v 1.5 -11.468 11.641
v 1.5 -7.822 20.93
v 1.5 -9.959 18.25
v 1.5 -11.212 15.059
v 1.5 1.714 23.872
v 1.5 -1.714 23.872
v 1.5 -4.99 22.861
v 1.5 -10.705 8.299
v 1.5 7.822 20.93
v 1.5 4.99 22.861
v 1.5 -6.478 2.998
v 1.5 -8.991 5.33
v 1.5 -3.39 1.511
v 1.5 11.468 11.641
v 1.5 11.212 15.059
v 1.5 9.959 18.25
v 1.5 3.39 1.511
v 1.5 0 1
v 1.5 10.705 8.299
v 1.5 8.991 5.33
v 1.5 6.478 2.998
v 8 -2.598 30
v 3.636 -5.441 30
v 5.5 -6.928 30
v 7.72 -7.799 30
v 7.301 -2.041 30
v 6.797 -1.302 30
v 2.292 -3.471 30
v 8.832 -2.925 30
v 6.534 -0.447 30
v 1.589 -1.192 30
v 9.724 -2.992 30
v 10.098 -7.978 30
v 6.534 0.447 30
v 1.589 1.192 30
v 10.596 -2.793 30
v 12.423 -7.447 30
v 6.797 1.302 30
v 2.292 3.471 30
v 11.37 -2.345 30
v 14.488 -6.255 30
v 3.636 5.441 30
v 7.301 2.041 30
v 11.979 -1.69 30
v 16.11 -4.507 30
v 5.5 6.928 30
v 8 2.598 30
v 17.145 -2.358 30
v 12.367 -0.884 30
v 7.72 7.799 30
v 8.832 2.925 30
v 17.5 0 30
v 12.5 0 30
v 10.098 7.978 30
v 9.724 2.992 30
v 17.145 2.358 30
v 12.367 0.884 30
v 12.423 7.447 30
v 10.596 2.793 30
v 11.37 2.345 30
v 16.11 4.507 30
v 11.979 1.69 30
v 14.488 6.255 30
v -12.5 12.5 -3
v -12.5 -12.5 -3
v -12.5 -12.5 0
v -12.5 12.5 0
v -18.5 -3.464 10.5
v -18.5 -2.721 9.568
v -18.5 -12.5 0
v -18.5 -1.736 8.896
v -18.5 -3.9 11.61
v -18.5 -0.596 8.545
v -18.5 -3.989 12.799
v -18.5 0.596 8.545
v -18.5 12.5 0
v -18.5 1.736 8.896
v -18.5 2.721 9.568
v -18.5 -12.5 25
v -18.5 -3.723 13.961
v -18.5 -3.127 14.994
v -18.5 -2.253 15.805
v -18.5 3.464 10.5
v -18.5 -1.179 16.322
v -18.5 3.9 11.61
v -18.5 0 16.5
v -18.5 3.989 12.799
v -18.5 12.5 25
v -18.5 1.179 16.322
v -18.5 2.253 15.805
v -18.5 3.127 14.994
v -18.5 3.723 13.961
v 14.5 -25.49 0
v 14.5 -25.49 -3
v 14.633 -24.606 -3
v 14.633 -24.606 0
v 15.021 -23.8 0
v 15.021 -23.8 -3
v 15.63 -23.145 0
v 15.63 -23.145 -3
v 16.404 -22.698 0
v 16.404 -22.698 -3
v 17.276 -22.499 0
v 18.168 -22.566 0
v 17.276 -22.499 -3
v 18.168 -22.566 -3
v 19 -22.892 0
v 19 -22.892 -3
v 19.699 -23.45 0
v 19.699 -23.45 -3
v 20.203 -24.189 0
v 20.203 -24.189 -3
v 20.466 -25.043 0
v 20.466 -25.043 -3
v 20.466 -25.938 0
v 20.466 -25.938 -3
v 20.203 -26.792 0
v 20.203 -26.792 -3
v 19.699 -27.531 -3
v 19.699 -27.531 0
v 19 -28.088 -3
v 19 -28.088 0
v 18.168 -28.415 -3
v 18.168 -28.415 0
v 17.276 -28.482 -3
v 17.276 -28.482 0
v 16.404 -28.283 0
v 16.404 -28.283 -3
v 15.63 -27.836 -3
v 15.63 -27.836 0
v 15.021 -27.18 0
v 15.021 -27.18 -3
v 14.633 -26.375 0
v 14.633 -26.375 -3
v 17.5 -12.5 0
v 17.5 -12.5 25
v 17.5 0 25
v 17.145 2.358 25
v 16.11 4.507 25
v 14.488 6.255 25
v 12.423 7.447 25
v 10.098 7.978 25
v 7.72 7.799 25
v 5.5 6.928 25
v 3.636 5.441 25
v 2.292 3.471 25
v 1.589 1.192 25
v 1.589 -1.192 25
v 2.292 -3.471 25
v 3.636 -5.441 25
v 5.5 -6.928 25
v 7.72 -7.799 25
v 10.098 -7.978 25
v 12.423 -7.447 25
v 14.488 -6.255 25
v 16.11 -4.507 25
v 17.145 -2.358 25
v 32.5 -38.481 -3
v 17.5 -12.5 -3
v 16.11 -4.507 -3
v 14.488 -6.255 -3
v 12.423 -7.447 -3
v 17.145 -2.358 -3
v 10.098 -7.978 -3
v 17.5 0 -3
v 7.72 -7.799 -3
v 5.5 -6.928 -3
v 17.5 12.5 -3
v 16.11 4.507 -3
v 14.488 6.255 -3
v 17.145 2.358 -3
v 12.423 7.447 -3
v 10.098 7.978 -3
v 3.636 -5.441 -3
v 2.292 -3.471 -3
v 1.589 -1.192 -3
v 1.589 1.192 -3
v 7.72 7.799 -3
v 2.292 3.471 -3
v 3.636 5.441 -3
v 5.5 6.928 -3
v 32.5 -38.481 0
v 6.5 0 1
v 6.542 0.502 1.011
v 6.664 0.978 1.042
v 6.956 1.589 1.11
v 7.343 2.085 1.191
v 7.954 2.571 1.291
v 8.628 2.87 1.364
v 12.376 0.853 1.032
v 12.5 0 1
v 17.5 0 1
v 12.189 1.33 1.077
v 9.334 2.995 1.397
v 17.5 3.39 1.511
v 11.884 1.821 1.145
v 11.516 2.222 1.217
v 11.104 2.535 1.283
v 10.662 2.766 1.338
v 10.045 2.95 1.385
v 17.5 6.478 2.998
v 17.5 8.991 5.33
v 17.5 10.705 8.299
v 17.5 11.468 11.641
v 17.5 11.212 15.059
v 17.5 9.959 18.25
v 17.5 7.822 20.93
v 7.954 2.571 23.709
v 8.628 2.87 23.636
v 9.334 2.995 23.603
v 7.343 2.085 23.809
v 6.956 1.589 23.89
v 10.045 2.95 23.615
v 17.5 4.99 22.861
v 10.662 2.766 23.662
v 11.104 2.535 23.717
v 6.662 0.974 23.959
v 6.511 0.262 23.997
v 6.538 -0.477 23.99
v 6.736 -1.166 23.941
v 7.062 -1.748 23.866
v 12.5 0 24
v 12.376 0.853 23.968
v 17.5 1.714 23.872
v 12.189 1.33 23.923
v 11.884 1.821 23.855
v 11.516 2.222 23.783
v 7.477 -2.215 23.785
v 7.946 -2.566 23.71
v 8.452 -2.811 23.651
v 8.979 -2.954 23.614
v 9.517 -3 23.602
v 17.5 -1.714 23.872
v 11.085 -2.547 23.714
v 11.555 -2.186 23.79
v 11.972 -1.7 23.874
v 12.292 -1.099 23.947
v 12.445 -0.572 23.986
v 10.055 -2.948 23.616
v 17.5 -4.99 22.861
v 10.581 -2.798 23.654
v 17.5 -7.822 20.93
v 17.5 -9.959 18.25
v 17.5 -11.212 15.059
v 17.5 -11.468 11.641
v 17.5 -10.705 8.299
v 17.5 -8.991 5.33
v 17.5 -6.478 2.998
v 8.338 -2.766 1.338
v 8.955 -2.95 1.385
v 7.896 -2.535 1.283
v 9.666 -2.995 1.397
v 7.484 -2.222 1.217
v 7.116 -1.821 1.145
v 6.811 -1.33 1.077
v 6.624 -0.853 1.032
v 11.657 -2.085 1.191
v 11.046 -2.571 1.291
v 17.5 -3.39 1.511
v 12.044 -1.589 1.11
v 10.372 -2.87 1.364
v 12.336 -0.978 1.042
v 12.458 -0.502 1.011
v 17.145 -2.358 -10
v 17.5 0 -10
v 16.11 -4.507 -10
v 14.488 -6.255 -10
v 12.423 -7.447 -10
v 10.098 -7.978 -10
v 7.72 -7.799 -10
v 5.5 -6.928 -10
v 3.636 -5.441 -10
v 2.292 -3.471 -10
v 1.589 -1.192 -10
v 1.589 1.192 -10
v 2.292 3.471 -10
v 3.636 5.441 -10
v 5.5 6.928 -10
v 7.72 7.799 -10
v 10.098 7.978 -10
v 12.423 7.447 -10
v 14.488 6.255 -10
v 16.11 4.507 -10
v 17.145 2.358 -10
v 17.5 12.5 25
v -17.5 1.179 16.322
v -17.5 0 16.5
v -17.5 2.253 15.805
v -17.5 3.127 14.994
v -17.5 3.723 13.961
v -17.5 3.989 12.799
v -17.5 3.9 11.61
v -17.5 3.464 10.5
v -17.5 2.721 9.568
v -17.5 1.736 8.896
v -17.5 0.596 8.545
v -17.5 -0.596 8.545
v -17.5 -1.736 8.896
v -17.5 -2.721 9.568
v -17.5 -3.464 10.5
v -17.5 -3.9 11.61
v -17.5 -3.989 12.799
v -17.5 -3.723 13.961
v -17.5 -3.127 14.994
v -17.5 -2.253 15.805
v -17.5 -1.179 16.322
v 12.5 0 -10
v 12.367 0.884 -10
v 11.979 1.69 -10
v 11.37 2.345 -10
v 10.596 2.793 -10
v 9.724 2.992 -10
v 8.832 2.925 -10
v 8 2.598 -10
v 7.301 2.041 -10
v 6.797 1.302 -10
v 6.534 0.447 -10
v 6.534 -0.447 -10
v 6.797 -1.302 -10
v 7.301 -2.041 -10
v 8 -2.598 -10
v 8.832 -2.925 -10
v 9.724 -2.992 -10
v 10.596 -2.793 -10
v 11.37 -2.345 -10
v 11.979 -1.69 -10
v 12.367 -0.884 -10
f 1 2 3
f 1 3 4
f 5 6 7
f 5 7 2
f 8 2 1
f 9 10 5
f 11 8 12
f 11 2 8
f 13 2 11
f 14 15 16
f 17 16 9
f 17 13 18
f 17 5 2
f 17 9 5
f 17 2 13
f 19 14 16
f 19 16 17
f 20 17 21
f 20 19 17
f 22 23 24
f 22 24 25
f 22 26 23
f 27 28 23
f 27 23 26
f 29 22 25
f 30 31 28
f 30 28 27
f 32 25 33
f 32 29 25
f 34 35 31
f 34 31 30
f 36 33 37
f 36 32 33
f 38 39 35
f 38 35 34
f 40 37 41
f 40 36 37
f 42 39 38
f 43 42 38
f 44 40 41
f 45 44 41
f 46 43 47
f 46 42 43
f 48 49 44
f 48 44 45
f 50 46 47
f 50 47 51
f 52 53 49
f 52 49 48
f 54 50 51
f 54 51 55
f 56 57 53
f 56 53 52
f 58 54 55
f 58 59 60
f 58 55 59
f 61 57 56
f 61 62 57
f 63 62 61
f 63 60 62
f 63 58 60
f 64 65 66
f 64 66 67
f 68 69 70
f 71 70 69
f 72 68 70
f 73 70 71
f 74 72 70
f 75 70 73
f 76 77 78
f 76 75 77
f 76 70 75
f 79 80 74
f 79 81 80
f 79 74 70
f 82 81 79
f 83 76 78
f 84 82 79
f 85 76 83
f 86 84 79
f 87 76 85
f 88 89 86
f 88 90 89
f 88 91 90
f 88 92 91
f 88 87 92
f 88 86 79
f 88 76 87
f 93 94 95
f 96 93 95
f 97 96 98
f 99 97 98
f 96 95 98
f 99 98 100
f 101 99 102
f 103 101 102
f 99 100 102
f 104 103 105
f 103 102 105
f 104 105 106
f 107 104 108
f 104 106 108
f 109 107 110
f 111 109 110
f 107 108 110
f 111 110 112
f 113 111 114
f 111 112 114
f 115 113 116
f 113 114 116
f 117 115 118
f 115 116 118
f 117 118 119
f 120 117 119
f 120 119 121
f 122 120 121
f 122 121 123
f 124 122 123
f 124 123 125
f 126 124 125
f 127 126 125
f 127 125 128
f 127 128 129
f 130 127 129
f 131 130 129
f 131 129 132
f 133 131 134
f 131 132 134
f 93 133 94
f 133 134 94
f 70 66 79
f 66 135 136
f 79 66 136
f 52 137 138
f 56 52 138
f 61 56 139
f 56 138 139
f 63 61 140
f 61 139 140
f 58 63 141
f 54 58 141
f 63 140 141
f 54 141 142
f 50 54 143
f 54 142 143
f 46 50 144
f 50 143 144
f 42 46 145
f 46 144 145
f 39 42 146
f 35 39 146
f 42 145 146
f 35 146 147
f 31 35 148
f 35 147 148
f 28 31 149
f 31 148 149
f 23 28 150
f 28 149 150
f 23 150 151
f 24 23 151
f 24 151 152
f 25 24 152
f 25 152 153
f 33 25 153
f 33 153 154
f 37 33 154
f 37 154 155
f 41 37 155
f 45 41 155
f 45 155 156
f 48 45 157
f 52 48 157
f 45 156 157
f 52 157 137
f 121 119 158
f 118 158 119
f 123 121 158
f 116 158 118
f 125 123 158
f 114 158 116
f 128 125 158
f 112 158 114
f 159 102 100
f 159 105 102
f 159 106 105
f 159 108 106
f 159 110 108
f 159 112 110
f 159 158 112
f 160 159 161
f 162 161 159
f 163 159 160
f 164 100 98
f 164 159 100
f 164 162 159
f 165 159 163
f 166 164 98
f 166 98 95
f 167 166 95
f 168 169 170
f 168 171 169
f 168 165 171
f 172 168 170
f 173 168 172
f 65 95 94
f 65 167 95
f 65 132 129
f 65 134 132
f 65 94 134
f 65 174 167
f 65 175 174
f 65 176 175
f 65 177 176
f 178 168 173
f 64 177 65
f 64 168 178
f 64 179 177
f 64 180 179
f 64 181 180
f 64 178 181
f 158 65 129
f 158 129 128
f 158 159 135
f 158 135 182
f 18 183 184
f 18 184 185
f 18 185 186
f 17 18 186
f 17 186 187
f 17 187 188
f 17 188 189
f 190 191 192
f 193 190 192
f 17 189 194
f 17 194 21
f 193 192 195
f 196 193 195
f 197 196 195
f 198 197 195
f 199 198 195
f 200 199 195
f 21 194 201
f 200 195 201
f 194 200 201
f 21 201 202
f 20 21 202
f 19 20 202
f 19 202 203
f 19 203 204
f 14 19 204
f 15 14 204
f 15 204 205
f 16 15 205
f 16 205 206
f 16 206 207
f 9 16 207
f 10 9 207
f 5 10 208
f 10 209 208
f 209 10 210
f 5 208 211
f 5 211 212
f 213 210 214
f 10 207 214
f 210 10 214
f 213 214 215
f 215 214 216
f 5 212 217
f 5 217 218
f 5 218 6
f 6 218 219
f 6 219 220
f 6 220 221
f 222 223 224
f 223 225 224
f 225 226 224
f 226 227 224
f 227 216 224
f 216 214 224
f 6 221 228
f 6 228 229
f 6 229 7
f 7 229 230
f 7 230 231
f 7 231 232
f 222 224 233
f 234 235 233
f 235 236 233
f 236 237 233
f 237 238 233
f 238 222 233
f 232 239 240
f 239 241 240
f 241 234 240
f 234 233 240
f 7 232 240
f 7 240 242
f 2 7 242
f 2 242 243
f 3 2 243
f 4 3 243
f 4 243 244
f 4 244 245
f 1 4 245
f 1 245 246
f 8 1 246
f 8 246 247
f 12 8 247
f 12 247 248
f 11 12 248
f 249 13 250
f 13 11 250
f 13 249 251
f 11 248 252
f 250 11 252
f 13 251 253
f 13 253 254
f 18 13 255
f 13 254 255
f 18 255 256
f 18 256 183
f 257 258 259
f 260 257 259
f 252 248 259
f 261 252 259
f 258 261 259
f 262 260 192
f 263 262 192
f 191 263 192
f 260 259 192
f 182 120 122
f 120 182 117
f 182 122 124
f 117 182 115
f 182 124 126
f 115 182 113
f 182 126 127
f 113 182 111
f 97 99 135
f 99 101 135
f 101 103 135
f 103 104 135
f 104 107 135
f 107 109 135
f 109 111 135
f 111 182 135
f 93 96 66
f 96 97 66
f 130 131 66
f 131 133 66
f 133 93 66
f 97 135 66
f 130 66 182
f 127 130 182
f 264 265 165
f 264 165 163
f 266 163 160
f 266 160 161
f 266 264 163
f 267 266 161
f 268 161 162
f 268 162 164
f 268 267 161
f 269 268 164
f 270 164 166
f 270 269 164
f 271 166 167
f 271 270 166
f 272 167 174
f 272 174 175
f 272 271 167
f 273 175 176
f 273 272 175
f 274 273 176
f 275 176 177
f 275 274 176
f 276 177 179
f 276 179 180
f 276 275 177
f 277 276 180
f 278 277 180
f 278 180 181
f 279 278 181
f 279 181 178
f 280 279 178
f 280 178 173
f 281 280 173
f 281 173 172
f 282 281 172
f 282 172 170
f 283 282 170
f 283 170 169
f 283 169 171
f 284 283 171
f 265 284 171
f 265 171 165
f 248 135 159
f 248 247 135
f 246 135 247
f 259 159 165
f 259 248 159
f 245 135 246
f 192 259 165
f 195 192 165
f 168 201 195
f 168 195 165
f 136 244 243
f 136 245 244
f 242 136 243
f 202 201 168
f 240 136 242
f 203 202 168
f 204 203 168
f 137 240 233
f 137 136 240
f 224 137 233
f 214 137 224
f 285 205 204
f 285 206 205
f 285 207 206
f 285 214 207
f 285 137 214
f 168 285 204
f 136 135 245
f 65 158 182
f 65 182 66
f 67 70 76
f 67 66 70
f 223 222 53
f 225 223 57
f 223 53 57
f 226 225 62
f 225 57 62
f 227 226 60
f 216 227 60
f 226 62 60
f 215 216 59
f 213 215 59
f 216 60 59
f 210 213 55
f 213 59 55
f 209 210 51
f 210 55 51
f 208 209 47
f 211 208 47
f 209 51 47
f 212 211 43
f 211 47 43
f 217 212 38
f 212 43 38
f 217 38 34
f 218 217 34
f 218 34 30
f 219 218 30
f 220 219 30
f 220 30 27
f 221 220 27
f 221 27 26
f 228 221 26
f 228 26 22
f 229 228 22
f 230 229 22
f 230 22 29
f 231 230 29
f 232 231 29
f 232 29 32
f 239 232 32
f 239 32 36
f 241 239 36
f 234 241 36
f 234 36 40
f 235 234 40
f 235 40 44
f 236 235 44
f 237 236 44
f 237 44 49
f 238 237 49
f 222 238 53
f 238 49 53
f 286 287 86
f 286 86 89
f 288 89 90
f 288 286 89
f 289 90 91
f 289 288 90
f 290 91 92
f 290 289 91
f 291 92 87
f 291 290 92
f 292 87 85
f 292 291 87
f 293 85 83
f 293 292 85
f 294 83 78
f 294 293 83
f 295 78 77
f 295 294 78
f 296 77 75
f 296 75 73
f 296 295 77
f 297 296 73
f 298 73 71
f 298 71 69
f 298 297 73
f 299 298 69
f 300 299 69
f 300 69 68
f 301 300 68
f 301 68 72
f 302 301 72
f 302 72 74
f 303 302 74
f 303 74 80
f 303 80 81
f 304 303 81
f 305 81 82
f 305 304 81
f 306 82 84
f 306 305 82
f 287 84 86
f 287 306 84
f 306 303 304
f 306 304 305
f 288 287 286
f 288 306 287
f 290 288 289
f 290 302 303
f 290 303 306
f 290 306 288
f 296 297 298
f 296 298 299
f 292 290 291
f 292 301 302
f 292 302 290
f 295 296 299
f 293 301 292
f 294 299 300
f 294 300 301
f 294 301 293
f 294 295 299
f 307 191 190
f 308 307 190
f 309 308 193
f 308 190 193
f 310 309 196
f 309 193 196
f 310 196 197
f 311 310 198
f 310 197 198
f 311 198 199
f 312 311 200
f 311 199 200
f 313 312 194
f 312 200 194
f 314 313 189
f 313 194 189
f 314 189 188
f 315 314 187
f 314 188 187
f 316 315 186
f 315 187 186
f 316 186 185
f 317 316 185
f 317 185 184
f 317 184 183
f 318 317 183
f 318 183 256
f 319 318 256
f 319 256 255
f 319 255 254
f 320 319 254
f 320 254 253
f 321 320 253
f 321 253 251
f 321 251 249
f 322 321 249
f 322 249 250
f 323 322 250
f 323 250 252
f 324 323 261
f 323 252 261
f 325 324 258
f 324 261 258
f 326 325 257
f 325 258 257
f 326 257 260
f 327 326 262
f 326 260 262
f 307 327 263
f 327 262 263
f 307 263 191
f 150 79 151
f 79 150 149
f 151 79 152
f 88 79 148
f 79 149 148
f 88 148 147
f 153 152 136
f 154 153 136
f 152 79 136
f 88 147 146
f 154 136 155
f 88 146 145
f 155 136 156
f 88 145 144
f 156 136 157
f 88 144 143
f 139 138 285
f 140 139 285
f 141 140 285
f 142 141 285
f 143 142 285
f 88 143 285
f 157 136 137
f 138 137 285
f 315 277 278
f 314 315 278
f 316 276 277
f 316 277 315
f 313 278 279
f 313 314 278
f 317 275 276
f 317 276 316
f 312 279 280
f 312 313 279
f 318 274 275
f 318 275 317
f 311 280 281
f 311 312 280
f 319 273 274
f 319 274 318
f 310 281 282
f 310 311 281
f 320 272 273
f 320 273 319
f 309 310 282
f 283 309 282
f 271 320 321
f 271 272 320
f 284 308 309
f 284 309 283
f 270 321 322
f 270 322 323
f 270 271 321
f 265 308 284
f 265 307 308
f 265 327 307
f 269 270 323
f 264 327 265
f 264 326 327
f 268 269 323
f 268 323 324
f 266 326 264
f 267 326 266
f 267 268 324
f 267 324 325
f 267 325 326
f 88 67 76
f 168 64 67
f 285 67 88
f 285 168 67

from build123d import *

# Parameters (mm, degrees)
SKETCH_1_W          = 35
SKETCH_1_H          = 25
SKETCH_1_R          = 8
EXTRUDE_2_DEPTH     = 25
SKETCH_2_R          = 8
EXTRUDE_3_DEPTH     = 5
EXTRUDE_START       = 10
SKETCH_3_R          = 8
EXTRUDE_4_DEPTH     = 10
SKETCH_4_R          = 3
CUT_EXTRUDE_1_DEPTH = 46.414755311
SKETCH_5_R          = 11.5
CUT_EXTRUDE_2_DEPTH = 16
SKETCH_6_R          = 4
EXTRUDE_5_DEPTH     = 15
SKETCH_8_W          = 3
SKETCH_8_H          = 2.025472792
CUT_EXTRUDE_3_DEPTH = 15
EXTRUDE_START_2     = -2
SKETCH_9_R          = 4
EXTRUDE_6_DEPTH     = 2
SKETCH_10_R         = 4
EXTRUDE_7_DEPTH     = 2
EXTRUDE_START_3     = 3
SKETCH_12_R         = 3
SKETCH_12_R_2       = 8
EXTRUDE_11_DEPTH    = 3
SKETCH_14_W         = 6.627877622
SKETCH_14_H         = 25
CUT_EXTRUDE_4_DEPTH = 3
SKETCH_15_W         = 25
SKETCH_15_H         = 25
CUT_EXTRUDE_5_DEPTH = 70.862501092
SKETCH_16_W         = 25
SKETCH_16_H         = 25
SKETCH_16_R         = 4
EXTRUDE_12_DEPTH    = 1


with BuildPart() as part:
    # 草图1 → 凸台-拉伸2 (new body)
    # profile 1 of 2: a face of its own
    with BuildSketch(Plane.XY):
        Rectangle(SKETCH_1_W, SKETCH_1_H)
        with Locations((9.5, 0)):
            Circle(SKETCH_1_R, mode=Mode.SUBTRACT)
    # profile 2 of 2: a face of its own
    with BuildSketch(Plane.XY):
        with Locations((9.5, 0)):
            Circle(SKETCH_1_R)
    extrude(amount=EXTRUDE_2_DEPTH)

    # 草图2 → 凸台-拉伸3 (add)
    with BuildSketch(Plane.XY.offset(25)):
        with Locations((9.5, 0)):
            Circle(SKETCH_2_R)
    extrude(amount=EXTRUDE_3_DEPTH)

    # 草图3 → 凸台-拉伸4 (add)
    with BuildSketch(Plane(origin=(0, 0, 0), x_dir=(-1, 0, 0), z_dir=(0, 0, -1)).offset(EXTRUDE_START)):
        with Locations(Location((-9.5, 0, 0), (0, 0, 180))):
            Circle(SKETCH_3_R)
    extrude(amount=-EXTRUDE_4_DEPTH)

    # 草图4 → 切除-拉伸1 (cut, through all)
    with BuildSketch(Plane.XY.offset(30)):
        with Locations((9.5, 0)):
            Circle(SKETCH_4_R)
    extrude(amount=-CUT_EXTRUDE_1_DEPTH, mode=Mode.SUBTRACT)

    # 草图5 → 切除-拉伸2 (cut)
    with BuildSketch(Plane(origin=(17.5, 0, 0), x_dir=(0, 0, -1), z_dir=(1, 0, 0))):
        with Locations((-12.5, 0)):
            Circle(SKETCH_5_R)
    extrude(amount=-CUT_EXTRUDE_2_DEPTH, mode=Mode.SUBTRACT)

    # 草图6 → 凸台-拉伸5 (add)
    with BuildSketch(Plane.ZY.offset(17.5)):
        with Locations((12.5, 0)):
            Circle(SKETCH_6_R)
    extrude(amount=EXTRUDE_5_DEPTH)

    # 草图8 → 切除-拉伸3 (cut)
    with BuildSketch(Plane.ZY.offset(17.5)):
        with Locations((17, 0)):
            Rectangle(SKETCH_8_W, SKETCH_8_H)
    extrude(amount=CUT_EXTRUDE_3_DEPTH, mode=Mode.SUBTRACT)

    # 草图9 → 凸台-拉伸6 (add)
    with BuildSketch(Plane.ZY.offset(32.5).offset(EXTRUDE_START_2)):
        with Locations(Location((12.5, 0, 0), (0, 0, 14.666011097))):
            Circle(SKETCH_9_R)
    extrude(amount=EXTRUDE_6_DEPTH)

    # 草图10 → 凸台-拉伸7 (add)
    with BuildSketch(Plane.ZY.offset(17.5)):
        with Locations((12.5, 0)):
            Circle(SKETCH_10_R)
    extrude(amount=EXTRUDE_7_DEPTH)

    # 草图12 → 凸台-拉伸11 (add)
    with BuildSketch(Plane(origin=(0, 0, 0), x_dir=(-1, 0, 0), z_dir=(0, 0, -1)).offset(EXTRUDE_START_3)):
        Polygon((12.5, 12.5), (-24.127877622, 12.5), (-24.127877622, -12.5), (-17.5, -12.5), (-32.5, -38.480762114), (12.5, -12.5), align=None)
        with Locations((-17.5, -25.490381057)):
            Circle(SKETCH_12_R, mode=Mode.SUBTRACT)
        with Locations(Location((-9.5, 0, 0), (0, 0, 180))):
            Circle(SKETCH_12_R_2, mode=Mode.SUBTRACT)
    extrude(amount=-EXTRUDE_11_DEPTH)

    # 草图14 → 切除-拉伸4 (cut)
    with BuildSketch(Plane.XY):
        with Locations((20.813938811, 0)):
            Rectangle(SKETCH_14_W, SKETCH_14_H)
    extrude(amount=-CUT_EXTRUDE_4_DEPTH, mode=Mode.SUBTRACT)

    # 草图15 → 切除-拉伸5 (cut, through all)
    with BuildSketch(Plane.ZY.offset(17.5)):
        with Locations((12.5, 0)):
            Rectangle(SKETCH_15_W, SKETCH_15_H)
    extrude(amount=CUT_EXTRUDE_5_DEPTH, mode=Mode.SUBTRACT)

    # 草图16 → 凸台-拉伸12 (add)
    with BuildSketch(Plane.ZY.offset(17.5)):
        with Locations((12.5, 0)):
            Rectangle(SKETCH_16_W, SKETCH_16_H)
        with Locations((12.5, 0)):
            Circle(SKETCH_16_R, mode=Mode.SUBTRACT)
    extrude(amount=EXTRUDE_12_DEPTH)


solid = part.part
